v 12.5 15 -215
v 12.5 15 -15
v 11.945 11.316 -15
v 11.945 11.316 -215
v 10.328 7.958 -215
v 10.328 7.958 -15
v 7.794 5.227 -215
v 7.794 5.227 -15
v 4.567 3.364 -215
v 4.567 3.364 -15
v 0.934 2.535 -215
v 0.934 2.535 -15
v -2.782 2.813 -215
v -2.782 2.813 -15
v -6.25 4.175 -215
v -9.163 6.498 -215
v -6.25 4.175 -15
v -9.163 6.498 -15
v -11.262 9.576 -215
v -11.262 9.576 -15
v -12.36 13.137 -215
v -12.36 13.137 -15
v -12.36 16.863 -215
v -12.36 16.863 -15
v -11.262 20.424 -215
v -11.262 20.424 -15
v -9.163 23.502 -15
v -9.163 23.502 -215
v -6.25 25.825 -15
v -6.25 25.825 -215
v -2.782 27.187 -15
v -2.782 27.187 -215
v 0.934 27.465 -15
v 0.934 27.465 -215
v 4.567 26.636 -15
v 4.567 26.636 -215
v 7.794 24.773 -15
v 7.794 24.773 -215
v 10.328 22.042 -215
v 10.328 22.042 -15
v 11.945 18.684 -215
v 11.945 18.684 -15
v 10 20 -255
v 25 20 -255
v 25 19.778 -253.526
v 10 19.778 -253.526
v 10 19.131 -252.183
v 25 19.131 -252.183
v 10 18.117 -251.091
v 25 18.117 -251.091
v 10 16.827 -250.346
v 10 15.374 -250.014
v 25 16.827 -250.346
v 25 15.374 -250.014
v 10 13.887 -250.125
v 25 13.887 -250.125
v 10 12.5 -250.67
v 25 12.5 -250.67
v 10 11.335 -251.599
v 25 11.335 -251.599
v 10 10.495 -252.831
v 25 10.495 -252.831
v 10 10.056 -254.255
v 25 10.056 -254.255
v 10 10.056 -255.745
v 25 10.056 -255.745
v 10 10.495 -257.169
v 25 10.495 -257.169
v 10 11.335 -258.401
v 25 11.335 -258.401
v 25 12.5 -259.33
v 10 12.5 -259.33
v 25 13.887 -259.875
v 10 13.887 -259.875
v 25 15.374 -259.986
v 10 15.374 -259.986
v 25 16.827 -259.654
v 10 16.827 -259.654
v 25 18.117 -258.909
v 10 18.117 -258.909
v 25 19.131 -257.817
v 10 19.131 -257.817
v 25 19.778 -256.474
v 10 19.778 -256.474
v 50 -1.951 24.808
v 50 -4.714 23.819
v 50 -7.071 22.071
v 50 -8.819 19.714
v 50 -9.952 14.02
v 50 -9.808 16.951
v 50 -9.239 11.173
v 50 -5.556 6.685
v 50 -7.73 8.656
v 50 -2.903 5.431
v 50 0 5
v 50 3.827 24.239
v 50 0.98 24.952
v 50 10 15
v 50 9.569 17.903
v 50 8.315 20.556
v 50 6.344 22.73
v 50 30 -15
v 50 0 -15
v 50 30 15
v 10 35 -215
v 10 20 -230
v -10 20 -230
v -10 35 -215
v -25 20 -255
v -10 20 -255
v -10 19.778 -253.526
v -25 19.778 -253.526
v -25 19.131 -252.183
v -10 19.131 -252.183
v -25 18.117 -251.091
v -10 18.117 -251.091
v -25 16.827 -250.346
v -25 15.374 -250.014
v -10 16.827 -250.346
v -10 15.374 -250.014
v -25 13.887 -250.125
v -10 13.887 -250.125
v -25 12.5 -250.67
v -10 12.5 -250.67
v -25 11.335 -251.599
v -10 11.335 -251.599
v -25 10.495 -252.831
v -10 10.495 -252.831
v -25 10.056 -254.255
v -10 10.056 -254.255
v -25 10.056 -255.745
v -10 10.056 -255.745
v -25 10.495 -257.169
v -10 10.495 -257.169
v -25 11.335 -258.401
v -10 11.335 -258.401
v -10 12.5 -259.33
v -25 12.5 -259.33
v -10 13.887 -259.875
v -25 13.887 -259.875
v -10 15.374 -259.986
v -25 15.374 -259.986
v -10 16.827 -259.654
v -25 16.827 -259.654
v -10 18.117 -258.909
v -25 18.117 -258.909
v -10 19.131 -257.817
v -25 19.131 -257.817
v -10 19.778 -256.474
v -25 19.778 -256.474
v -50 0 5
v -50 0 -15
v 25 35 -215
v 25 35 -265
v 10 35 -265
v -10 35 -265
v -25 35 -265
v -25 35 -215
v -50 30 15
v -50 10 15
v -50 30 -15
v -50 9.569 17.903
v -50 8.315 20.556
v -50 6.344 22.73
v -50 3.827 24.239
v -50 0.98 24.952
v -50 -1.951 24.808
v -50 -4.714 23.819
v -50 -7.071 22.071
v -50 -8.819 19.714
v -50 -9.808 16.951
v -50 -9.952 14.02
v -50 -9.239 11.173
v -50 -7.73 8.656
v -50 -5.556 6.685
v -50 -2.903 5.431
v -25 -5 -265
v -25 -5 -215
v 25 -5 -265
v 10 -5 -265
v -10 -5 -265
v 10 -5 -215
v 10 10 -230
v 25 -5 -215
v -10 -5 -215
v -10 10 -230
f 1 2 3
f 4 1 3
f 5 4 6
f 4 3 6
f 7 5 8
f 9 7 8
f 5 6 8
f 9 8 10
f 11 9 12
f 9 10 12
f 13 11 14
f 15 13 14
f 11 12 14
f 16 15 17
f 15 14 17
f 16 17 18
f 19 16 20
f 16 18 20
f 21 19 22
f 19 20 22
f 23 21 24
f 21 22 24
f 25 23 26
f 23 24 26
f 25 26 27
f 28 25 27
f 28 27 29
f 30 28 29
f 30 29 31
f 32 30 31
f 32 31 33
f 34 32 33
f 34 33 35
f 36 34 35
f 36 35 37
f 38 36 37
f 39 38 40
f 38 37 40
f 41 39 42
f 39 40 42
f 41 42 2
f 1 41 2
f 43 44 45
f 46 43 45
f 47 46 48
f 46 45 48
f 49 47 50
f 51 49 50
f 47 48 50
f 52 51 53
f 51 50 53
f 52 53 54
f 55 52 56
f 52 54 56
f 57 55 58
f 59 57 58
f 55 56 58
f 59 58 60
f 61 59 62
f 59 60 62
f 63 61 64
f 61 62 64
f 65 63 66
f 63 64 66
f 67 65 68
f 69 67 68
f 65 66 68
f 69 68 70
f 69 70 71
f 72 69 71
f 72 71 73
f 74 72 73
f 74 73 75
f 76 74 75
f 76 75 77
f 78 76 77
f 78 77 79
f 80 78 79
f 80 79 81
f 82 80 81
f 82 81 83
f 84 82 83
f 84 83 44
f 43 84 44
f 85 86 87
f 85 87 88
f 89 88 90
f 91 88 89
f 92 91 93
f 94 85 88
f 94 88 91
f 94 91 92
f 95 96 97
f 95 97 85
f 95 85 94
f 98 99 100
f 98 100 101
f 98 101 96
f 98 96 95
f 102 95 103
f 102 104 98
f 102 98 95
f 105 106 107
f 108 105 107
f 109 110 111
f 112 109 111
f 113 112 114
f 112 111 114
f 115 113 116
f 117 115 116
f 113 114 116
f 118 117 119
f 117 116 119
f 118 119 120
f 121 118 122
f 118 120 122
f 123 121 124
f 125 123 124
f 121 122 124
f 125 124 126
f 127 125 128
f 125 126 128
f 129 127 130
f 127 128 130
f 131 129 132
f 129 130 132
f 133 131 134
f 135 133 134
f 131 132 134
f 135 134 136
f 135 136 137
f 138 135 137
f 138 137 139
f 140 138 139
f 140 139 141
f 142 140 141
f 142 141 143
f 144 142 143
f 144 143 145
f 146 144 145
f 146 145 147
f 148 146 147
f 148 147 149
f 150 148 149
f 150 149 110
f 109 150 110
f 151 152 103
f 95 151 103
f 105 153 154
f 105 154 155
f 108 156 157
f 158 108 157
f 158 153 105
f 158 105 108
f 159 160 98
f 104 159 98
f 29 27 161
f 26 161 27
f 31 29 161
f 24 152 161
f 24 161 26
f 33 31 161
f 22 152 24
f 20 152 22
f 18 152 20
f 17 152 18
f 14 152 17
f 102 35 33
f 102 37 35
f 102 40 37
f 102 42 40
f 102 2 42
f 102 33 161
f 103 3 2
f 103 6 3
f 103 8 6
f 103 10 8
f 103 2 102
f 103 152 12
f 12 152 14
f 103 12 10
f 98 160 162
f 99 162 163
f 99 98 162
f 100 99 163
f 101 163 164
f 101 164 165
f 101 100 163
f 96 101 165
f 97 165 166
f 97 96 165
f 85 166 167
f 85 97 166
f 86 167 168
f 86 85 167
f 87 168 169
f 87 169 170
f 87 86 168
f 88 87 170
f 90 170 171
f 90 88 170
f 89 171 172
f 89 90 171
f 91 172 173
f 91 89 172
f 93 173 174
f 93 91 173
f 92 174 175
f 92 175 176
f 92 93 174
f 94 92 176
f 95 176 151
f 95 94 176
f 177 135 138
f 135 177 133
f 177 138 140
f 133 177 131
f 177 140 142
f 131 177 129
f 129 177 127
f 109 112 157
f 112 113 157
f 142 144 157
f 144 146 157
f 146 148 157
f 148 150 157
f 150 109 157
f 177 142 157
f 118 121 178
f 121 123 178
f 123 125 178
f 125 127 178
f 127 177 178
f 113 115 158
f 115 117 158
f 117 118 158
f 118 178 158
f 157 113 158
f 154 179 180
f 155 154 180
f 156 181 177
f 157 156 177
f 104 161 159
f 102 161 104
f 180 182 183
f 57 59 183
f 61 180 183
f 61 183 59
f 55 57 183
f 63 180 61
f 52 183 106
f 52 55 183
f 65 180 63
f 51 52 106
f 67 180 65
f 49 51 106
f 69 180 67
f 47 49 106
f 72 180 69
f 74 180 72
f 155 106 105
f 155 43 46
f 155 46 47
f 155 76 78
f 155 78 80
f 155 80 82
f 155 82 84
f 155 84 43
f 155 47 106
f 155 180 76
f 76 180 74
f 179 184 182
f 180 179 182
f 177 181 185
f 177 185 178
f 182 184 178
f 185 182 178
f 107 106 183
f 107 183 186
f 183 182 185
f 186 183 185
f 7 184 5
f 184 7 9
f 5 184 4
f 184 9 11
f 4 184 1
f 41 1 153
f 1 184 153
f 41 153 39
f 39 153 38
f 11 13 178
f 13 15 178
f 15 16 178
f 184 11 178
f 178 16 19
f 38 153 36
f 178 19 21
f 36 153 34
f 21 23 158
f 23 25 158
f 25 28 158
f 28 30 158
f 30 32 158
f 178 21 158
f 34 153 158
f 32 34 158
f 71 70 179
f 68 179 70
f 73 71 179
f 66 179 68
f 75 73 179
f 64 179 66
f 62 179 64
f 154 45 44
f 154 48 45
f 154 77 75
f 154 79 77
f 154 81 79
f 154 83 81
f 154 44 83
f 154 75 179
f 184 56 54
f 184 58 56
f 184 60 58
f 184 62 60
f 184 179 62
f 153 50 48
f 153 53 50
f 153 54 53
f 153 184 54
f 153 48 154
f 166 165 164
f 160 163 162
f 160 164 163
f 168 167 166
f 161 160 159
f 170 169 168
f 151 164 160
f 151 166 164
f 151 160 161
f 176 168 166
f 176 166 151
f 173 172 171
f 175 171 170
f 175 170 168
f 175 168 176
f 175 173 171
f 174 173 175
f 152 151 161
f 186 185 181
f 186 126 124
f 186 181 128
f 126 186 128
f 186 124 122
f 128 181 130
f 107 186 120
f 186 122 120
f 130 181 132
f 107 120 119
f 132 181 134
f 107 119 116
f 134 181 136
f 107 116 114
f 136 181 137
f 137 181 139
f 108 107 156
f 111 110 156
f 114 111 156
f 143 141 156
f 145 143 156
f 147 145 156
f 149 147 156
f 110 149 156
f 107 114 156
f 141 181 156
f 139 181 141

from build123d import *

# Parameters (mm, degrees)
SKIZZE1_W                       = 100
SKIZZE1_H                       = 30
AUFSATZ_LINEAR_AUSTRAGEN1_DEPTH = 30
SKIZZE2_R                       = 10
AUFSATZ_LINEAR_AUSTRAGEN2_DEPTH = 100
SKIZZE3_R                       = 12.5
AUFSATZ_LINEAR_AUSTRAGEN3_DEPTH = 200
SKIZZE4_W                       = 50
SKIZZE4_H                       = 40
AUFSATZ_LINEAR_AUSTRAGEN4_DEPTH = 50
SKIZZE6_W                       = 20
SKIZZE6_H                       = 70
SCHNITT_LINEAR_AUSTRAGEN2_DEPTH = 35
FASE1_SIZE                      = 15
SKIZZE7_R                       = 5
SCHNITT_LINEAR_AUSTRAGEN3_DEPTH = 54


with BuildPart() as part:
    # Skizze1 → Aufsatz-Linear austragen1 (new body)
    with BuildSketch(Plane(origin=(0, 0, 0), x_dir=(1, 0, 0), z_dir=(0, 1, 0))):
        Rectangle(SKIZZE1_W, SKIZZE1_H)
    extrude(amount=AUFSATZ_LINEAR_AUSTRAGEN1_DEPTH)

    # Skizze2 → Aufsatz-Linear austragen2 (add)
    with BuildSketch(Plane(origin=(50, 0, 0), x_dir=(0, 0, -1), z_dir=(1, 0, 0))):
        with Locations((-15, 0)):
            Circle(SKIZZE2_R)
    extrude(amount=-AUFSATZ_LINEAR_AUSTRAGEN2_DEPTH)

    # Skizze3 → Aufsatz-Linear austragen3 (add)
    with BuildSketch(Plane(origin=(0, 0, -15), x_dir=(-1, 0, 0), z_dir=(0, 0, -1))):
        with Locations(Location((0, 15, 0), (0, 0, 180))):
            Circle(SKIZZE3_R)
    extrude(amount=AUFSATZ_LINEAR_AUSTRAGEN3_DEPTH)

    # Skizze4 → Aufsatz-Linear austragen4 (add)
    with BuildSketch(Plane(origin=(0, 0, -215), x_dir=(-1, 0, 0), z_dir=(0, 0, -1))):
        with Locations((0, 15)):
            Rectangle(SKIZZE4_W, SKIZZE4_H)
    extrude(amount=AUFSATZ_LINEAR_AUSTRAGEN4_DEPTH)

    # Skizze6 → Schnitt-Linear austragen2 (cut)
    with BuildSketch(Plane(origin=(0, 0, -265), x_dir=(-1, 0, 0), z_dir=(0, 0, -1))):
        Rectangle(SKIZZE6_W, SKIZZE6_H)
    extrude(amount=-SCHNITT_LINEAR_AUSTRAGEN2_DEPTH, mode=Mode.SUBTRACT)

    # Fase1
    fase1_edges = [part.edges().sort_by_distance(p)[0] for p in [
        (0, -5, -230),
        (0, 35, -230),
    ]]
    chamfer(fase1_edges, length=FASE1_SIZE - 0.0001)  # a hair under: the kernel refuses the full size

    # Skizze7 → Schnitt-Linear austragen3 (cut)
    with BuildSketch(Plane(origin=(25, 0, 0), x_dir=(0, 0, -1), z_dir=(1, 0, 0))):
        with Locations(Location((255, 15, 0), (0, 0, 90))):
            Circle(SKIZZE7_R)
    extrude(amount=-SCHNITT_LINEAR_AUSTRAGEN3_DEPTH, mode=Mode.SUBTRACT)


solid = part.part
